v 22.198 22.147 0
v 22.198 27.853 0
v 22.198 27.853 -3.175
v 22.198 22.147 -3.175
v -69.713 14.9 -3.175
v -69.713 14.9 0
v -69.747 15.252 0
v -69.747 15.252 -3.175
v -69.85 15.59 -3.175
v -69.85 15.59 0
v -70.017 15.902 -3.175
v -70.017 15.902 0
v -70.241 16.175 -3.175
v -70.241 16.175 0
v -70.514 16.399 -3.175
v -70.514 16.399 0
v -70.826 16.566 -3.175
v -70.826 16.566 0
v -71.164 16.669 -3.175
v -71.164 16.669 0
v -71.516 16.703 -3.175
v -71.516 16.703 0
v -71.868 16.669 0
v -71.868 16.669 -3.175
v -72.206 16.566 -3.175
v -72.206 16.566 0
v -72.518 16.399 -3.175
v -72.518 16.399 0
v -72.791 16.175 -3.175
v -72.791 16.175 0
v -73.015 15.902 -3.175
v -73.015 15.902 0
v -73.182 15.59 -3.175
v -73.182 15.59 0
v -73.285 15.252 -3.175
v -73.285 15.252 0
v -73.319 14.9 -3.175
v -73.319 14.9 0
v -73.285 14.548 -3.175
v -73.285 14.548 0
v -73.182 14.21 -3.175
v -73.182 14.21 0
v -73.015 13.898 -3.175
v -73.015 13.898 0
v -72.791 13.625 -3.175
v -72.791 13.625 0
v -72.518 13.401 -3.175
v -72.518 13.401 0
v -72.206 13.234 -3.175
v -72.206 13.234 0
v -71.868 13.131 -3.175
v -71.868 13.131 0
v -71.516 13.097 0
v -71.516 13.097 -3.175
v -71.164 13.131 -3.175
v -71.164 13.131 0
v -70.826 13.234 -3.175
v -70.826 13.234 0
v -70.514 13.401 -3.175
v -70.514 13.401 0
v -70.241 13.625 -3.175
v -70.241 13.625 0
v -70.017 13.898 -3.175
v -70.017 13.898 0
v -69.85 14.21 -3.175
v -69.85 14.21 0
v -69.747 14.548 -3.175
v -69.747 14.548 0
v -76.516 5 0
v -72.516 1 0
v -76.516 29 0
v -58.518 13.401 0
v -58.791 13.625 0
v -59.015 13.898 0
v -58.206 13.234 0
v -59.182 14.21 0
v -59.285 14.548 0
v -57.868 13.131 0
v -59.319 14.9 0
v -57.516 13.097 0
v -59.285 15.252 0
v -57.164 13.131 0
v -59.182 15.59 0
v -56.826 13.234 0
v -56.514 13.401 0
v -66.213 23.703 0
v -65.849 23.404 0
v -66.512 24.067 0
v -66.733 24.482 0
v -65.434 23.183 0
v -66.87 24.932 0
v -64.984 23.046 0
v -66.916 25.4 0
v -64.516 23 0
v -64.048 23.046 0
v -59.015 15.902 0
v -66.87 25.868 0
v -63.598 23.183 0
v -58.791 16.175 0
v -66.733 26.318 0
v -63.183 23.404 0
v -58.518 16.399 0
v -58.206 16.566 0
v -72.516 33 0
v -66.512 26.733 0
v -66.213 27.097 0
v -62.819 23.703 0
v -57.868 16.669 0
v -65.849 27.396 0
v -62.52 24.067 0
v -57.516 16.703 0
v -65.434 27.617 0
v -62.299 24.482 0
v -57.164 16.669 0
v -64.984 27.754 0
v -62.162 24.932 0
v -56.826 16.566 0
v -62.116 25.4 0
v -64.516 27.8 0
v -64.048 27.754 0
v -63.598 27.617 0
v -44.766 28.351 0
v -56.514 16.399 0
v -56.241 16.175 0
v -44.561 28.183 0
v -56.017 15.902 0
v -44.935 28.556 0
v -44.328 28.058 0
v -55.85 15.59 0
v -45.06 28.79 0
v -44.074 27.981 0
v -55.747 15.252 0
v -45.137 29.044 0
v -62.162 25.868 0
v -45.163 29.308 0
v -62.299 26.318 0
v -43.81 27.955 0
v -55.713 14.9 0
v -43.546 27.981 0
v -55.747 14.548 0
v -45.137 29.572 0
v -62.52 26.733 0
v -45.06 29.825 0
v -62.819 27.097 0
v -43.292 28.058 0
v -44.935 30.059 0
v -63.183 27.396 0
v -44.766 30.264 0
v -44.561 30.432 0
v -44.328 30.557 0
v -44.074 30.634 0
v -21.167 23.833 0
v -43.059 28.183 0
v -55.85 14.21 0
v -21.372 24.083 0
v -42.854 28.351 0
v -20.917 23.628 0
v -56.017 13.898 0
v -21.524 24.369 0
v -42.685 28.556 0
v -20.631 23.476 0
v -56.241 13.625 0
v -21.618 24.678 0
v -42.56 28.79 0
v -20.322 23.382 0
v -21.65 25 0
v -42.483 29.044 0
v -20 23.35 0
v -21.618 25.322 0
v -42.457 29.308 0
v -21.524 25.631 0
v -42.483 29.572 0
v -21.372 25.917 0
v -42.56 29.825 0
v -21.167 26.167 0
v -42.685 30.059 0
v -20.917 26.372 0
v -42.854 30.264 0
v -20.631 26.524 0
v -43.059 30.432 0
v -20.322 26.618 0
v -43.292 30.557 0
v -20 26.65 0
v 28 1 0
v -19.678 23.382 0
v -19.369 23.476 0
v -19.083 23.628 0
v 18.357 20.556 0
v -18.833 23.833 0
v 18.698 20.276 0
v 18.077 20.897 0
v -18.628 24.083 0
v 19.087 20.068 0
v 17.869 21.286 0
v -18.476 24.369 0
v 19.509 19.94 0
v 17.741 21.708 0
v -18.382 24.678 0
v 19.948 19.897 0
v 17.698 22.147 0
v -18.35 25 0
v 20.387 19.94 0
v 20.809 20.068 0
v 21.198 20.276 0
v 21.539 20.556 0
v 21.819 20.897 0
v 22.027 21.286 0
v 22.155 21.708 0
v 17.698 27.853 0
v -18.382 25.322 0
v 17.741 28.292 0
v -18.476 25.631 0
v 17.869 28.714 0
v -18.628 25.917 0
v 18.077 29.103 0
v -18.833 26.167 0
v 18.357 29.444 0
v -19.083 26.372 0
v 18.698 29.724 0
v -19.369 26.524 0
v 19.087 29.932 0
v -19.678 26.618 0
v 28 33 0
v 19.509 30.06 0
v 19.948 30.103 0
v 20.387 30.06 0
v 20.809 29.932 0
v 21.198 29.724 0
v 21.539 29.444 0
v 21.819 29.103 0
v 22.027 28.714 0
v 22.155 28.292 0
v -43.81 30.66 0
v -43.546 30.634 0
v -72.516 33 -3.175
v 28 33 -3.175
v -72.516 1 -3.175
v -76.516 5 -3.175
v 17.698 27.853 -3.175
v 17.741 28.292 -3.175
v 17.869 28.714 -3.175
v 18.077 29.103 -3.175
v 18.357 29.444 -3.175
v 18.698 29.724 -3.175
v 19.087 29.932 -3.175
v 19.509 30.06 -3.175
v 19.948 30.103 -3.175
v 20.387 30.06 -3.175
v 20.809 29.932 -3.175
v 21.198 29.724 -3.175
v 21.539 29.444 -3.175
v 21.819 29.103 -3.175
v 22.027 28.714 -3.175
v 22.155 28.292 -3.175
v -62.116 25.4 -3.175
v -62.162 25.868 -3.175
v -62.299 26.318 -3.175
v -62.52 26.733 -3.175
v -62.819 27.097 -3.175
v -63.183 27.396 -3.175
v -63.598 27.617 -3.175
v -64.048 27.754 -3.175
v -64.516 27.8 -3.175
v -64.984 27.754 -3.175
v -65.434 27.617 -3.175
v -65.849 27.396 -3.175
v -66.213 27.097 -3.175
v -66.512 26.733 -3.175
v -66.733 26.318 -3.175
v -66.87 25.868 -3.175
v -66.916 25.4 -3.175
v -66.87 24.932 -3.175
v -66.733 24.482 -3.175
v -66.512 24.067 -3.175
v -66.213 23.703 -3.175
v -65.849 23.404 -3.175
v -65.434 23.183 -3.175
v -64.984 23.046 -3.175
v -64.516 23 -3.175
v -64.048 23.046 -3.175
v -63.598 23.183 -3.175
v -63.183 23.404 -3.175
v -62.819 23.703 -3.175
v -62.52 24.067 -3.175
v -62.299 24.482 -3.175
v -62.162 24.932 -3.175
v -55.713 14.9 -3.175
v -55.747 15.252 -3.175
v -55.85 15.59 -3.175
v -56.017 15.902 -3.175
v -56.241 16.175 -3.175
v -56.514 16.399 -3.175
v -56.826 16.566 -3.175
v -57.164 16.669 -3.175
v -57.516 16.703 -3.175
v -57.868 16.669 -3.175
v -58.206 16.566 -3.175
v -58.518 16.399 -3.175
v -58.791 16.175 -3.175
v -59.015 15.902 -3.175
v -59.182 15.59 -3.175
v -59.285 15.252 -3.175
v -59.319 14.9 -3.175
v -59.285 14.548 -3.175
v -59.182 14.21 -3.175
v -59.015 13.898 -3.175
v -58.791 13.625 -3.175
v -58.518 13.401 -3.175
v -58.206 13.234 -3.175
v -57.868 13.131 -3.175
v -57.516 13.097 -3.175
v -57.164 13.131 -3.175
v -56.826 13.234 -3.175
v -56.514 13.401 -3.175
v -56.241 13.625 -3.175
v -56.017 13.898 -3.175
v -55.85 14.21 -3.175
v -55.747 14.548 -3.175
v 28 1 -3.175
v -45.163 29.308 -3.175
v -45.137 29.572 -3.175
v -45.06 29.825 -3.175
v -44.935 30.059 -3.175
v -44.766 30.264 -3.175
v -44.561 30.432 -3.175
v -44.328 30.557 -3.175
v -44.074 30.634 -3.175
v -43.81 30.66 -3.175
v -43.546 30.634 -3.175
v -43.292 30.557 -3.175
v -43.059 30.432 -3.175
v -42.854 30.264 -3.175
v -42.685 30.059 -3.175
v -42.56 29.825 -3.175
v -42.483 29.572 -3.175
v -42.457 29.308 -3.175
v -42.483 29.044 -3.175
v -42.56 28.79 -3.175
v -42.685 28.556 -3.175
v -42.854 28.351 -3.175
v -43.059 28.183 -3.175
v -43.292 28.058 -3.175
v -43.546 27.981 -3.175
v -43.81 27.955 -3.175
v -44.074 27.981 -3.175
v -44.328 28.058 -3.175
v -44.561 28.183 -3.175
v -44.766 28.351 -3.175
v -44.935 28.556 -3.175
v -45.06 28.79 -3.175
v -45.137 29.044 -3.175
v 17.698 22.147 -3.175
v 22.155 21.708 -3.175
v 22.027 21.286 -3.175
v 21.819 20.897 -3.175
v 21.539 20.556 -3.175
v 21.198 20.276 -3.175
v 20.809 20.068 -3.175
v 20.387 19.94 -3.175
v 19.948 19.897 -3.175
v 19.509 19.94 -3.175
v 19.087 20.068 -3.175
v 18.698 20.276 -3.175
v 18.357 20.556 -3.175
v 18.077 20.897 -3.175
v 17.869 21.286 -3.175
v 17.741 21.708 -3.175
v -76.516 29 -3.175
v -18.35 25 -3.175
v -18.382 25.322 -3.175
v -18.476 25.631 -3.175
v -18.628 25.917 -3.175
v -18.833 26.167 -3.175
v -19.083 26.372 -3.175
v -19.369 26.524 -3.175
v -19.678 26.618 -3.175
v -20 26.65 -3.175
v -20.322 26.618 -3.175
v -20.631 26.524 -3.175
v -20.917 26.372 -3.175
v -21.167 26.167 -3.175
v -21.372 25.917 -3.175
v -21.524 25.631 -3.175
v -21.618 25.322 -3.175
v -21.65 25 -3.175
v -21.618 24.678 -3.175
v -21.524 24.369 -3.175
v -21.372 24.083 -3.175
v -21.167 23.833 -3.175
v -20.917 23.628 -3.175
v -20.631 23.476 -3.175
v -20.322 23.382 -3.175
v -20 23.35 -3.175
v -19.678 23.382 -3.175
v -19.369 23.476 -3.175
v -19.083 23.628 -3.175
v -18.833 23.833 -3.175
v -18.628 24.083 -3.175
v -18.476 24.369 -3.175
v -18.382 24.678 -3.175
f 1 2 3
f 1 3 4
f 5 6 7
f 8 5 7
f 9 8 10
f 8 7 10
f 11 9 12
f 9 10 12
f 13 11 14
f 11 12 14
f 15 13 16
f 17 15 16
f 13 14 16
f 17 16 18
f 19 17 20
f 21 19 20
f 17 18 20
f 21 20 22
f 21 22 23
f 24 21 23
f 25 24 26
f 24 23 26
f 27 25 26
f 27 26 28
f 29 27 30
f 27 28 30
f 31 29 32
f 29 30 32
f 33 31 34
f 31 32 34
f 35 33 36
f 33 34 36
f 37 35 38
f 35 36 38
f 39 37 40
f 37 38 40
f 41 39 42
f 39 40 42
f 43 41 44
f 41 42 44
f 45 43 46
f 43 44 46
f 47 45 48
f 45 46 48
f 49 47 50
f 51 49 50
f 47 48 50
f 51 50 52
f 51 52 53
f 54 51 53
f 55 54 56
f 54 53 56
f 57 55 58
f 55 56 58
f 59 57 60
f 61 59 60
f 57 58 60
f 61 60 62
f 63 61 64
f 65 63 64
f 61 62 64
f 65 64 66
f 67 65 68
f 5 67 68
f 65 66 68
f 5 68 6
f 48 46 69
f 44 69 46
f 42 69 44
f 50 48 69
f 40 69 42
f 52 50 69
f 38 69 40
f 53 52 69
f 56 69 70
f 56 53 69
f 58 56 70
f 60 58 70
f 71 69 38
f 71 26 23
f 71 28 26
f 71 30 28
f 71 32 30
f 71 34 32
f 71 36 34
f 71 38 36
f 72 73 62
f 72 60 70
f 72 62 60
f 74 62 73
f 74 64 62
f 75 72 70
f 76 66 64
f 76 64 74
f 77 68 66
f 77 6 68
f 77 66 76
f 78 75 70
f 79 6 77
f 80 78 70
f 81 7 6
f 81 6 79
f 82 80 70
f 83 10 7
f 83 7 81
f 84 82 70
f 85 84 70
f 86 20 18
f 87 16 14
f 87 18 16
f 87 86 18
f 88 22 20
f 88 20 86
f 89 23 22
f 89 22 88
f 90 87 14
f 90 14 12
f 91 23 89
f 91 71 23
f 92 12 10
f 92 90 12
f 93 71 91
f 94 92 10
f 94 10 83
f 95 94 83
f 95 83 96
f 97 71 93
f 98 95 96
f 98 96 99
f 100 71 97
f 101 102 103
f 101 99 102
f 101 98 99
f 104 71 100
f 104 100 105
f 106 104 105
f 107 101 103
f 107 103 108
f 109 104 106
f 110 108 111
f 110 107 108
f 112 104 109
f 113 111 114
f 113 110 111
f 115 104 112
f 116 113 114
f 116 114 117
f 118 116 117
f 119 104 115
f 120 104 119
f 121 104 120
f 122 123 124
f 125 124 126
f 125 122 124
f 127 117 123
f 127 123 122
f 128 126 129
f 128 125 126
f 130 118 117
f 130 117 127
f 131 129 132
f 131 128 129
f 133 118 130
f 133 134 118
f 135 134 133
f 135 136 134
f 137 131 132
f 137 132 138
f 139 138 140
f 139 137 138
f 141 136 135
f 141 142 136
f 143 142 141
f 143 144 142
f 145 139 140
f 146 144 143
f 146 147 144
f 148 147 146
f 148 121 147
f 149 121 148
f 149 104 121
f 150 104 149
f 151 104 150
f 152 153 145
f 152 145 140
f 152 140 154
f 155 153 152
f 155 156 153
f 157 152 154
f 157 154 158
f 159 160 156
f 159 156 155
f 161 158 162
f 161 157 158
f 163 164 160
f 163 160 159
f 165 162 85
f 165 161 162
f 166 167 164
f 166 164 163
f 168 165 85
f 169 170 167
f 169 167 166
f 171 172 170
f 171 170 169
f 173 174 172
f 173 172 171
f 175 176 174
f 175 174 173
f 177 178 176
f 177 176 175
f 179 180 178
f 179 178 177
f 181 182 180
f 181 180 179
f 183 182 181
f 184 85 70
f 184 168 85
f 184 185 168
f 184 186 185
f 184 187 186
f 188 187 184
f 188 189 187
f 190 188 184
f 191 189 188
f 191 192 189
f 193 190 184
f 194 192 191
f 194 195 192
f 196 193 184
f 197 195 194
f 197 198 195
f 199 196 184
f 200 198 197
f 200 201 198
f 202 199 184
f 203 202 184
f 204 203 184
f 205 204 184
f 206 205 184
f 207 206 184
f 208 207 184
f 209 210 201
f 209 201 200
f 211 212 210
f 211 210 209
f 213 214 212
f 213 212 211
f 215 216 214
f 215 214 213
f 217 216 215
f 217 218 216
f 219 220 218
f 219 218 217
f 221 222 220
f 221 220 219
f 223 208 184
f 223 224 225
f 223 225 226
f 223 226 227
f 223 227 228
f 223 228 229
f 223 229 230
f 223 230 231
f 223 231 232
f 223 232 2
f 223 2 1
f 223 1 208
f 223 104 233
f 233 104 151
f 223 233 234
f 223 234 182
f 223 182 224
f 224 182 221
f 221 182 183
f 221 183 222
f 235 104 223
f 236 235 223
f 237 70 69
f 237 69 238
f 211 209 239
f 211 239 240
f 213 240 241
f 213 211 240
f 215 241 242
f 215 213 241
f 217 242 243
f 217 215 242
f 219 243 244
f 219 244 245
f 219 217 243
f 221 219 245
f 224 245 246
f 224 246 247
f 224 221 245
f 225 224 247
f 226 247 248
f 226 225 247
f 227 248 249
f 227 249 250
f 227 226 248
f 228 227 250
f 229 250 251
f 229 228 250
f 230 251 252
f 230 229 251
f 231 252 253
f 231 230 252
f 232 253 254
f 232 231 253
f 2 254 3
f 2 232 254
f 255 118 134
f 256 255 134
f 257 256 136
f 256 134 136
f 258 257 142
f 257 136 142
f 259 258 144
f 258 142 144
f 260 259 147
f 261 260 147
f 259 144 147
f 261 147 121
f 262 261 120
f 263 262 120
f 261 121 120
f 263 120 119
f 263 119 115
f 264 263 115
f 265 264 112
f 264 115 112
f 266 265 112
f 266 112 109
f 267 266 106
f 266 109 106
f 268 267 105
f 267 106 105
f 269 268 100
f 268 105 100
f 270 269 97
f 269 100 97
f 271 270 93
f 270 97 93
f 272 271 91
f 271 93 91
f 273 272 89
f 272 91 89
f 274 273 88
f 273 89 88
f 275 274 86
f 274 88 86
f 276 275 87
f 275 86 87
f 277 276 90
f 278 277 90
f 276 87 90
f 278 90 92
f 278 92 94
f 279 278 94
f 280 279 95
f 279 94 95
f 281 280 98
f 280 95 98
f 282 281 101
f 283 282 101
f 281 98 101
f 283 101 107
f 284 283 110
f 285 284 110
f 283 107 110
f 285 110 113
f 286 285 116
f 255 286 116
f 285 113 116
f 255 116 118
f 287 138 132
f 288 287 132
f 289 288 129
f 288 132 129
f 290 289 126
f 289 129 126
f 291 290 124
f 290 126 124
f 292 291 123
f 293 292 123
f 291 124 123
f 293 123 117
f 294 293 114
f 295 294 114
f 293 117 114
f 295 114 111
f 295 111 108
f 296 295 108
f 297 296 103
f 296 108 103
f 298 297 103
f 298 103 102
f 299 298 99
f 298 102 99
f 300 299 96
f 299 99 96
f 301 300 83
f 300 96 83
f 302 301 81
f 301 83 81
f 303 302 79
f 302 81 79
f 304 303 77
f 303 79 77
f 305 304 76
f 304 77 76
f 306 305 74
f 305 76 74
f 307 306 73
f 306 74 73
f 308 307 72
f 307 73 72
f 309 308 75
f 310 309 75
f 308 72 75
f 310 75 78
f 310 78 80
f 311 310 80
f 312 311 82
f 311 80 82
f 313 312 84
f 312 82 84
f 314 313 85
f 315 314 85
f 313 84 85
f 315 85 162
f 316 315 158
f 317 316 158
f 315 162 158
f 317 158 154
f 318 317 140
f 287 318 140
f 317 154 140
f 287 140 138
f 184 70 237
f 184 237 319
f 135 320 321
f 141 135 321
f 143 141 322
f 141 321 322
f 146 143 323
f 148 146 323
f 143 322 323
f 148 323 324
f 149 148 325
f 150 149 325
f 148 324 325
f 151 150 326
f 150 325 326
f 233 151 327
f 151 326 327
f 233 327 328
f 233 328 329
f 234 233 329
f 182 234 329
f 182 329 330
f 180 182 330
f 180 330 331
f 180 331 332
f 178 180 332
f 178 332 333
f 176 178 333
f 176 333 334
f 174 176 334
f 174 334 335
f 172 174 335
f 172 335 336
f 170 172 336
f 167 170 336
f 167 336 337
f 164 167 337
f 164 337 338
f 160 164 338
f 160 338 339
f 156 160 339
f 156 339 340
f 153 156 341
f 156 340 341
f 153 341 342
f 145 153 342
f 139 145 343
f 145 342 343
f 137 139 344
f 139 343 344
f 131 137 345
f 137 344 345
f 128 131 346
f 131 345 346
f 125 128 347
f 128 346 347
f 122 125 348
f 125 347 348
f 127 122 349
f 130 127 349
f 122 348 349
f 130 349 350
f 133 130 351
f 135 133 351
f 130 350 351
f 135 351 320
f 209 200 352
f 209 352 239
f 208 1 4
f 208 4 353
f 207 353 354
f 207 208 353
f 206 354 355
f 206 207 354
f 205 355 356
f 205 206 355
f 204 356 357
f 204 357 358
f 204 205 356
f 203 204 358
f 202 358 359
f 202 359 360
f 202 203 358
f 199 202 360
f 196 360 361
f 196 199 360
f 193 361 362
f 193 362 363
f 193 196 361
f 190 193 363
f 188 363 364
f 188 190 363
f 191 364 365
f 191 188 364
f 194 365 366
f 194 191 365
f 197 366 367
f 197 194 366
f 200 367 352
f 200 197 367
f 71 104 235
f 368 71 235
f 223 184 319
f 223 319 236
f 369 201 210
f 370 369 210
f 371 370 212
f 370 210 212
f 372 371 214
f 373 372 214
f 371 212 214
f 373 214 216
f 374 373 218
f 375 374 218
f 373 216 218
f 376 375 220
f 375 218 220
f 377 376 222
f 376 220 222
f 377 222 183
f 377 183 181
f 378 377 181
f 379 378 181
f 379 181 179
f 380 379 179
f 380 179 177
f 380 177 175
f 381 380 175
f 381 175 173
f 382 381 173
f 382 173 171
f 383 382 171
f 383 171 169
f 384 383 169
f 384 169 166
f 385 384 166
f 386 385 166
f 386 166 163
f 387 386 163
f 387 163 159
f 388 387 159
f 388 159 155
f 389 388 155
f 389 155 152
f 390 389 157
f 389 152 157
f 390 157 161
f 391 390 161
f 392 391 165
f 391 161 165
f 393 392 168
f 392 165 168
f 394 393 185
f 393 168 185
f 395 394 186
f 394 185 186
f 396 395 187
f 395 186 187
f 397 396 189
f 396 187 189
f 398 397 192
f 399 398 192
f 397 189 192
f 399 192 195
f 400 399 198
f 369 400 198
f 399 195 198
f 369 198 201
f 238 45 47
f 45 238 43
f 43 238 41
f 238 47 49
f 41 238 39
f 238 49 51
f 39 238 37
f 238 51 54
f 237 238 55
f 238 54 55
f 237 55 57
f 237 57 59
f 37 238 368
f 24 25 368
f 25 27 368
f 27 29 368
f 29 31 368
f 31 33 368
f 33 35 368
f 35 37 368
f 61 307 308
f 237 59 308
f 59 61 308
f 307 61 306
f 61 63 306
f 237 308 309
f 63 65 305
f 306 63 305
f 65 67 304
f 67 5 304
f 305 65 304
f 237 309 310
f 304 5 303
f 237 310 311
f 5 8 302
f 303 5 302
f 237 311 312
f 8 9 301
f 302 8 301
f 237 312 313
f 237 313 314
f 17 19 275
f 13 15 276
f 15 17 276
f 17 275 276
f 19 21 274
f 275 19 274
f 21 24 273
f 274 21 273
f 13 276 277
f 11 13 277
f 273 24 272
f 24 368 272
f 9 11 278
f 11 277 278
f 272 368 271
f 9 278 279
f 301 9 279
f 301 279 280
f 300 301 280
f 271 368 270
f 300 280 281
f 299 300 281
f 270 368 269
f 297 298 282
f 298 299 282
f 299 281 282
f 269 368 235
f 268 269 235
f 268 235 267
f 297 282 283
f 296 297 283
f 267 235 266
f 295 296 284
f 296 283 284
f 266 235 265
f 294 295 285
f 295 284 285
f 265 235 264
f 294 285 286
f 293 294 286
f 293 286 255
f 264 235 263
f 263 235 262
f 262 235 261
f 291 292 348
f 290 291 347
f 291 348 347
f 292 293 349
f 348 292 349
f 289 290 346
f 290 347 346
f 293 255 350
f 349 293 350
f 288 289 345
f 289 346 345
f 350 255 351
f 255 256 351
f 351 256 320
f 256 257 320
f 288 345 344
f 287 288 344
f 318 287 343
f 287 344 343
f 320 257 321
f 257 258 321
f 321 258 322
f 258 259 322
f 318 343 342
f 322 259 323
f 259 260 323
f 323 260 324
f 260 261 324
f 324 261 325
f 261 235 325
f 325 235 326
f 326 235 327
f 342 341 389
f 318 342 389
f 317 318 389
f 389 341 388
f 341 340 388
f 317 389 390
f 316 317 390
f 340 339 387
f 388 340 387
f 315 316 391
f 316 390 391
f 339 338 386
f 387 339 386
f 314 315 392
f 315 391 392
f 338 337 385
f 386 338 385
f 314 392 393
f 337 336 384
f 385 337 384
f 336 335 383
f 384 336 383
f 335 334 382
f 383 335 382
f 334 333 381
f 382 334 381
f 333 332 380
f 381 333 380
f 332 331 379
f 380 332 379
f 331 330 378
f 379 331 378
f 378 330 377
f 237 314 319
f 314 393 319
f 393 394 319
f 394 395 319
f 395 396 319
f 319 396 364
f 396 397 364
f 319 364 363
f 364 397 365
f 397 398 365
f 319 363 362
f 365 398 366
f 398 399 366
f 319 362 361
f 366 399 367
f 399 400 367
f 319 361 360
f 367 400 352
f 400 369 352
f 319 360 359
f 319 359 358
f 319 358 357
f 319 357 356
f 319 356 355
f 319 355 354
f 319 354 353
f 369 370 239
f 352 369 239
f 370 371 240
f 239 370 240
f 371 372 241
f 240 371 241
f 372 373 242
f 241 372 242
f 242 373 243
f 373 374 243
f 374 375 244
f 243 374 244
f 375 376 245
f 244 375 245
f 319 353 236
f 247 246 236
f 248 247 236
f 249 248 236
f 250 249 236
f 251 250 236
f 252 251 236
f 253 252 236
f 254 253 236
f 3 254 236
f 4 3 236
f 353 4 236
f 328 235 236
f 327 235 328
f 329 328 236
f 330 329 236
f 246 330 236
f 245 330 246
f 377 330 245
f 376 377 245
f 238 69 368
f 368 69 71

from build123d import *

# Parameters (mm, degrees)
SKETCH1_W             = 104.516
SKETCH1_H             = 32
SKETCH1_R             = 2.4
SKETCH1_R_2           = 1.8034
BOSS_EXTRUDE1_DEPTH   = 3.175
M4X0_7_TAPPED_HOLE1_D = 3.3
CHAMFER1_SIZE         = 4
F_6_32_TAPPED_HOLE1_D = 2.7051


with BuildPart() as part:
    # Sketch1 → Boss-Extrude1 (new body)
    with BuildSketch(Plane.XY):
        with Locations((-24.258, 17)):
            Rectangle(SKETCH1_W, SKETCH1_H)
        with Locations((-64.516, 25.4)):
            Circle(SKETCH1_R, mode=Mode.SUBTRACT)
        with Locations((-57.516, 14.9)):
            Circle(SKETCH1_R_2, mode=Mode.SUBTRACT)
        with Locations((-71.516, 14.9)):
            Circle(SKETCH1_R_2, mode=Mode.SUBTRACT)
        with BuildLine():
            Line((22.198129856, 27.852934279), (22.198129856, 22.147065721))
            ThreePointArc((22.198129856, 22.147065721), (19.948129856, 19.897065721), (17.698129856, 22.147065721))
            Line((17.698129856, 22.147065721), (17.698129856, 27.852934279))
            ThreePointArc((17.698129856, 27.852934279), (19.948129856, 30.102934279), (22.198129856, 27.852934279))
        make_face(mode=Mode.SUBTRACT)
    extrude(amount=-BOSS_EXTRUDE1_DEPTH)

    # M4x0.7 Tapped Hole1 (through all)
    with Locations(Plane(origin=(0, 0, -3.175), x_dir=(-1, 0, 0), z_dir=(0, 0, -1))):
        with Locations((20, 25)):
            Hole(M4X0_7_TAPPED_HOLE1_D / 2)

    # Chamfer1
    chamfer1_edges = [part.edges().sort_by_distance(p)[0] for p in [
        (-76.516, 1, -1.5875),
        (-76.516, 33, -1.5875),
    ]]
    chamfer(chamfer1_edges, length=CHAMFER1_SIZE)

    # #6-32 Tapped Hole1 (through all)
    with Locations(Plane.XY):
        with Locations((-43.81, 29.3078)):
            Hole(F_6_32_TAPPED_HOLE1_D / 2)


solid = part.part
